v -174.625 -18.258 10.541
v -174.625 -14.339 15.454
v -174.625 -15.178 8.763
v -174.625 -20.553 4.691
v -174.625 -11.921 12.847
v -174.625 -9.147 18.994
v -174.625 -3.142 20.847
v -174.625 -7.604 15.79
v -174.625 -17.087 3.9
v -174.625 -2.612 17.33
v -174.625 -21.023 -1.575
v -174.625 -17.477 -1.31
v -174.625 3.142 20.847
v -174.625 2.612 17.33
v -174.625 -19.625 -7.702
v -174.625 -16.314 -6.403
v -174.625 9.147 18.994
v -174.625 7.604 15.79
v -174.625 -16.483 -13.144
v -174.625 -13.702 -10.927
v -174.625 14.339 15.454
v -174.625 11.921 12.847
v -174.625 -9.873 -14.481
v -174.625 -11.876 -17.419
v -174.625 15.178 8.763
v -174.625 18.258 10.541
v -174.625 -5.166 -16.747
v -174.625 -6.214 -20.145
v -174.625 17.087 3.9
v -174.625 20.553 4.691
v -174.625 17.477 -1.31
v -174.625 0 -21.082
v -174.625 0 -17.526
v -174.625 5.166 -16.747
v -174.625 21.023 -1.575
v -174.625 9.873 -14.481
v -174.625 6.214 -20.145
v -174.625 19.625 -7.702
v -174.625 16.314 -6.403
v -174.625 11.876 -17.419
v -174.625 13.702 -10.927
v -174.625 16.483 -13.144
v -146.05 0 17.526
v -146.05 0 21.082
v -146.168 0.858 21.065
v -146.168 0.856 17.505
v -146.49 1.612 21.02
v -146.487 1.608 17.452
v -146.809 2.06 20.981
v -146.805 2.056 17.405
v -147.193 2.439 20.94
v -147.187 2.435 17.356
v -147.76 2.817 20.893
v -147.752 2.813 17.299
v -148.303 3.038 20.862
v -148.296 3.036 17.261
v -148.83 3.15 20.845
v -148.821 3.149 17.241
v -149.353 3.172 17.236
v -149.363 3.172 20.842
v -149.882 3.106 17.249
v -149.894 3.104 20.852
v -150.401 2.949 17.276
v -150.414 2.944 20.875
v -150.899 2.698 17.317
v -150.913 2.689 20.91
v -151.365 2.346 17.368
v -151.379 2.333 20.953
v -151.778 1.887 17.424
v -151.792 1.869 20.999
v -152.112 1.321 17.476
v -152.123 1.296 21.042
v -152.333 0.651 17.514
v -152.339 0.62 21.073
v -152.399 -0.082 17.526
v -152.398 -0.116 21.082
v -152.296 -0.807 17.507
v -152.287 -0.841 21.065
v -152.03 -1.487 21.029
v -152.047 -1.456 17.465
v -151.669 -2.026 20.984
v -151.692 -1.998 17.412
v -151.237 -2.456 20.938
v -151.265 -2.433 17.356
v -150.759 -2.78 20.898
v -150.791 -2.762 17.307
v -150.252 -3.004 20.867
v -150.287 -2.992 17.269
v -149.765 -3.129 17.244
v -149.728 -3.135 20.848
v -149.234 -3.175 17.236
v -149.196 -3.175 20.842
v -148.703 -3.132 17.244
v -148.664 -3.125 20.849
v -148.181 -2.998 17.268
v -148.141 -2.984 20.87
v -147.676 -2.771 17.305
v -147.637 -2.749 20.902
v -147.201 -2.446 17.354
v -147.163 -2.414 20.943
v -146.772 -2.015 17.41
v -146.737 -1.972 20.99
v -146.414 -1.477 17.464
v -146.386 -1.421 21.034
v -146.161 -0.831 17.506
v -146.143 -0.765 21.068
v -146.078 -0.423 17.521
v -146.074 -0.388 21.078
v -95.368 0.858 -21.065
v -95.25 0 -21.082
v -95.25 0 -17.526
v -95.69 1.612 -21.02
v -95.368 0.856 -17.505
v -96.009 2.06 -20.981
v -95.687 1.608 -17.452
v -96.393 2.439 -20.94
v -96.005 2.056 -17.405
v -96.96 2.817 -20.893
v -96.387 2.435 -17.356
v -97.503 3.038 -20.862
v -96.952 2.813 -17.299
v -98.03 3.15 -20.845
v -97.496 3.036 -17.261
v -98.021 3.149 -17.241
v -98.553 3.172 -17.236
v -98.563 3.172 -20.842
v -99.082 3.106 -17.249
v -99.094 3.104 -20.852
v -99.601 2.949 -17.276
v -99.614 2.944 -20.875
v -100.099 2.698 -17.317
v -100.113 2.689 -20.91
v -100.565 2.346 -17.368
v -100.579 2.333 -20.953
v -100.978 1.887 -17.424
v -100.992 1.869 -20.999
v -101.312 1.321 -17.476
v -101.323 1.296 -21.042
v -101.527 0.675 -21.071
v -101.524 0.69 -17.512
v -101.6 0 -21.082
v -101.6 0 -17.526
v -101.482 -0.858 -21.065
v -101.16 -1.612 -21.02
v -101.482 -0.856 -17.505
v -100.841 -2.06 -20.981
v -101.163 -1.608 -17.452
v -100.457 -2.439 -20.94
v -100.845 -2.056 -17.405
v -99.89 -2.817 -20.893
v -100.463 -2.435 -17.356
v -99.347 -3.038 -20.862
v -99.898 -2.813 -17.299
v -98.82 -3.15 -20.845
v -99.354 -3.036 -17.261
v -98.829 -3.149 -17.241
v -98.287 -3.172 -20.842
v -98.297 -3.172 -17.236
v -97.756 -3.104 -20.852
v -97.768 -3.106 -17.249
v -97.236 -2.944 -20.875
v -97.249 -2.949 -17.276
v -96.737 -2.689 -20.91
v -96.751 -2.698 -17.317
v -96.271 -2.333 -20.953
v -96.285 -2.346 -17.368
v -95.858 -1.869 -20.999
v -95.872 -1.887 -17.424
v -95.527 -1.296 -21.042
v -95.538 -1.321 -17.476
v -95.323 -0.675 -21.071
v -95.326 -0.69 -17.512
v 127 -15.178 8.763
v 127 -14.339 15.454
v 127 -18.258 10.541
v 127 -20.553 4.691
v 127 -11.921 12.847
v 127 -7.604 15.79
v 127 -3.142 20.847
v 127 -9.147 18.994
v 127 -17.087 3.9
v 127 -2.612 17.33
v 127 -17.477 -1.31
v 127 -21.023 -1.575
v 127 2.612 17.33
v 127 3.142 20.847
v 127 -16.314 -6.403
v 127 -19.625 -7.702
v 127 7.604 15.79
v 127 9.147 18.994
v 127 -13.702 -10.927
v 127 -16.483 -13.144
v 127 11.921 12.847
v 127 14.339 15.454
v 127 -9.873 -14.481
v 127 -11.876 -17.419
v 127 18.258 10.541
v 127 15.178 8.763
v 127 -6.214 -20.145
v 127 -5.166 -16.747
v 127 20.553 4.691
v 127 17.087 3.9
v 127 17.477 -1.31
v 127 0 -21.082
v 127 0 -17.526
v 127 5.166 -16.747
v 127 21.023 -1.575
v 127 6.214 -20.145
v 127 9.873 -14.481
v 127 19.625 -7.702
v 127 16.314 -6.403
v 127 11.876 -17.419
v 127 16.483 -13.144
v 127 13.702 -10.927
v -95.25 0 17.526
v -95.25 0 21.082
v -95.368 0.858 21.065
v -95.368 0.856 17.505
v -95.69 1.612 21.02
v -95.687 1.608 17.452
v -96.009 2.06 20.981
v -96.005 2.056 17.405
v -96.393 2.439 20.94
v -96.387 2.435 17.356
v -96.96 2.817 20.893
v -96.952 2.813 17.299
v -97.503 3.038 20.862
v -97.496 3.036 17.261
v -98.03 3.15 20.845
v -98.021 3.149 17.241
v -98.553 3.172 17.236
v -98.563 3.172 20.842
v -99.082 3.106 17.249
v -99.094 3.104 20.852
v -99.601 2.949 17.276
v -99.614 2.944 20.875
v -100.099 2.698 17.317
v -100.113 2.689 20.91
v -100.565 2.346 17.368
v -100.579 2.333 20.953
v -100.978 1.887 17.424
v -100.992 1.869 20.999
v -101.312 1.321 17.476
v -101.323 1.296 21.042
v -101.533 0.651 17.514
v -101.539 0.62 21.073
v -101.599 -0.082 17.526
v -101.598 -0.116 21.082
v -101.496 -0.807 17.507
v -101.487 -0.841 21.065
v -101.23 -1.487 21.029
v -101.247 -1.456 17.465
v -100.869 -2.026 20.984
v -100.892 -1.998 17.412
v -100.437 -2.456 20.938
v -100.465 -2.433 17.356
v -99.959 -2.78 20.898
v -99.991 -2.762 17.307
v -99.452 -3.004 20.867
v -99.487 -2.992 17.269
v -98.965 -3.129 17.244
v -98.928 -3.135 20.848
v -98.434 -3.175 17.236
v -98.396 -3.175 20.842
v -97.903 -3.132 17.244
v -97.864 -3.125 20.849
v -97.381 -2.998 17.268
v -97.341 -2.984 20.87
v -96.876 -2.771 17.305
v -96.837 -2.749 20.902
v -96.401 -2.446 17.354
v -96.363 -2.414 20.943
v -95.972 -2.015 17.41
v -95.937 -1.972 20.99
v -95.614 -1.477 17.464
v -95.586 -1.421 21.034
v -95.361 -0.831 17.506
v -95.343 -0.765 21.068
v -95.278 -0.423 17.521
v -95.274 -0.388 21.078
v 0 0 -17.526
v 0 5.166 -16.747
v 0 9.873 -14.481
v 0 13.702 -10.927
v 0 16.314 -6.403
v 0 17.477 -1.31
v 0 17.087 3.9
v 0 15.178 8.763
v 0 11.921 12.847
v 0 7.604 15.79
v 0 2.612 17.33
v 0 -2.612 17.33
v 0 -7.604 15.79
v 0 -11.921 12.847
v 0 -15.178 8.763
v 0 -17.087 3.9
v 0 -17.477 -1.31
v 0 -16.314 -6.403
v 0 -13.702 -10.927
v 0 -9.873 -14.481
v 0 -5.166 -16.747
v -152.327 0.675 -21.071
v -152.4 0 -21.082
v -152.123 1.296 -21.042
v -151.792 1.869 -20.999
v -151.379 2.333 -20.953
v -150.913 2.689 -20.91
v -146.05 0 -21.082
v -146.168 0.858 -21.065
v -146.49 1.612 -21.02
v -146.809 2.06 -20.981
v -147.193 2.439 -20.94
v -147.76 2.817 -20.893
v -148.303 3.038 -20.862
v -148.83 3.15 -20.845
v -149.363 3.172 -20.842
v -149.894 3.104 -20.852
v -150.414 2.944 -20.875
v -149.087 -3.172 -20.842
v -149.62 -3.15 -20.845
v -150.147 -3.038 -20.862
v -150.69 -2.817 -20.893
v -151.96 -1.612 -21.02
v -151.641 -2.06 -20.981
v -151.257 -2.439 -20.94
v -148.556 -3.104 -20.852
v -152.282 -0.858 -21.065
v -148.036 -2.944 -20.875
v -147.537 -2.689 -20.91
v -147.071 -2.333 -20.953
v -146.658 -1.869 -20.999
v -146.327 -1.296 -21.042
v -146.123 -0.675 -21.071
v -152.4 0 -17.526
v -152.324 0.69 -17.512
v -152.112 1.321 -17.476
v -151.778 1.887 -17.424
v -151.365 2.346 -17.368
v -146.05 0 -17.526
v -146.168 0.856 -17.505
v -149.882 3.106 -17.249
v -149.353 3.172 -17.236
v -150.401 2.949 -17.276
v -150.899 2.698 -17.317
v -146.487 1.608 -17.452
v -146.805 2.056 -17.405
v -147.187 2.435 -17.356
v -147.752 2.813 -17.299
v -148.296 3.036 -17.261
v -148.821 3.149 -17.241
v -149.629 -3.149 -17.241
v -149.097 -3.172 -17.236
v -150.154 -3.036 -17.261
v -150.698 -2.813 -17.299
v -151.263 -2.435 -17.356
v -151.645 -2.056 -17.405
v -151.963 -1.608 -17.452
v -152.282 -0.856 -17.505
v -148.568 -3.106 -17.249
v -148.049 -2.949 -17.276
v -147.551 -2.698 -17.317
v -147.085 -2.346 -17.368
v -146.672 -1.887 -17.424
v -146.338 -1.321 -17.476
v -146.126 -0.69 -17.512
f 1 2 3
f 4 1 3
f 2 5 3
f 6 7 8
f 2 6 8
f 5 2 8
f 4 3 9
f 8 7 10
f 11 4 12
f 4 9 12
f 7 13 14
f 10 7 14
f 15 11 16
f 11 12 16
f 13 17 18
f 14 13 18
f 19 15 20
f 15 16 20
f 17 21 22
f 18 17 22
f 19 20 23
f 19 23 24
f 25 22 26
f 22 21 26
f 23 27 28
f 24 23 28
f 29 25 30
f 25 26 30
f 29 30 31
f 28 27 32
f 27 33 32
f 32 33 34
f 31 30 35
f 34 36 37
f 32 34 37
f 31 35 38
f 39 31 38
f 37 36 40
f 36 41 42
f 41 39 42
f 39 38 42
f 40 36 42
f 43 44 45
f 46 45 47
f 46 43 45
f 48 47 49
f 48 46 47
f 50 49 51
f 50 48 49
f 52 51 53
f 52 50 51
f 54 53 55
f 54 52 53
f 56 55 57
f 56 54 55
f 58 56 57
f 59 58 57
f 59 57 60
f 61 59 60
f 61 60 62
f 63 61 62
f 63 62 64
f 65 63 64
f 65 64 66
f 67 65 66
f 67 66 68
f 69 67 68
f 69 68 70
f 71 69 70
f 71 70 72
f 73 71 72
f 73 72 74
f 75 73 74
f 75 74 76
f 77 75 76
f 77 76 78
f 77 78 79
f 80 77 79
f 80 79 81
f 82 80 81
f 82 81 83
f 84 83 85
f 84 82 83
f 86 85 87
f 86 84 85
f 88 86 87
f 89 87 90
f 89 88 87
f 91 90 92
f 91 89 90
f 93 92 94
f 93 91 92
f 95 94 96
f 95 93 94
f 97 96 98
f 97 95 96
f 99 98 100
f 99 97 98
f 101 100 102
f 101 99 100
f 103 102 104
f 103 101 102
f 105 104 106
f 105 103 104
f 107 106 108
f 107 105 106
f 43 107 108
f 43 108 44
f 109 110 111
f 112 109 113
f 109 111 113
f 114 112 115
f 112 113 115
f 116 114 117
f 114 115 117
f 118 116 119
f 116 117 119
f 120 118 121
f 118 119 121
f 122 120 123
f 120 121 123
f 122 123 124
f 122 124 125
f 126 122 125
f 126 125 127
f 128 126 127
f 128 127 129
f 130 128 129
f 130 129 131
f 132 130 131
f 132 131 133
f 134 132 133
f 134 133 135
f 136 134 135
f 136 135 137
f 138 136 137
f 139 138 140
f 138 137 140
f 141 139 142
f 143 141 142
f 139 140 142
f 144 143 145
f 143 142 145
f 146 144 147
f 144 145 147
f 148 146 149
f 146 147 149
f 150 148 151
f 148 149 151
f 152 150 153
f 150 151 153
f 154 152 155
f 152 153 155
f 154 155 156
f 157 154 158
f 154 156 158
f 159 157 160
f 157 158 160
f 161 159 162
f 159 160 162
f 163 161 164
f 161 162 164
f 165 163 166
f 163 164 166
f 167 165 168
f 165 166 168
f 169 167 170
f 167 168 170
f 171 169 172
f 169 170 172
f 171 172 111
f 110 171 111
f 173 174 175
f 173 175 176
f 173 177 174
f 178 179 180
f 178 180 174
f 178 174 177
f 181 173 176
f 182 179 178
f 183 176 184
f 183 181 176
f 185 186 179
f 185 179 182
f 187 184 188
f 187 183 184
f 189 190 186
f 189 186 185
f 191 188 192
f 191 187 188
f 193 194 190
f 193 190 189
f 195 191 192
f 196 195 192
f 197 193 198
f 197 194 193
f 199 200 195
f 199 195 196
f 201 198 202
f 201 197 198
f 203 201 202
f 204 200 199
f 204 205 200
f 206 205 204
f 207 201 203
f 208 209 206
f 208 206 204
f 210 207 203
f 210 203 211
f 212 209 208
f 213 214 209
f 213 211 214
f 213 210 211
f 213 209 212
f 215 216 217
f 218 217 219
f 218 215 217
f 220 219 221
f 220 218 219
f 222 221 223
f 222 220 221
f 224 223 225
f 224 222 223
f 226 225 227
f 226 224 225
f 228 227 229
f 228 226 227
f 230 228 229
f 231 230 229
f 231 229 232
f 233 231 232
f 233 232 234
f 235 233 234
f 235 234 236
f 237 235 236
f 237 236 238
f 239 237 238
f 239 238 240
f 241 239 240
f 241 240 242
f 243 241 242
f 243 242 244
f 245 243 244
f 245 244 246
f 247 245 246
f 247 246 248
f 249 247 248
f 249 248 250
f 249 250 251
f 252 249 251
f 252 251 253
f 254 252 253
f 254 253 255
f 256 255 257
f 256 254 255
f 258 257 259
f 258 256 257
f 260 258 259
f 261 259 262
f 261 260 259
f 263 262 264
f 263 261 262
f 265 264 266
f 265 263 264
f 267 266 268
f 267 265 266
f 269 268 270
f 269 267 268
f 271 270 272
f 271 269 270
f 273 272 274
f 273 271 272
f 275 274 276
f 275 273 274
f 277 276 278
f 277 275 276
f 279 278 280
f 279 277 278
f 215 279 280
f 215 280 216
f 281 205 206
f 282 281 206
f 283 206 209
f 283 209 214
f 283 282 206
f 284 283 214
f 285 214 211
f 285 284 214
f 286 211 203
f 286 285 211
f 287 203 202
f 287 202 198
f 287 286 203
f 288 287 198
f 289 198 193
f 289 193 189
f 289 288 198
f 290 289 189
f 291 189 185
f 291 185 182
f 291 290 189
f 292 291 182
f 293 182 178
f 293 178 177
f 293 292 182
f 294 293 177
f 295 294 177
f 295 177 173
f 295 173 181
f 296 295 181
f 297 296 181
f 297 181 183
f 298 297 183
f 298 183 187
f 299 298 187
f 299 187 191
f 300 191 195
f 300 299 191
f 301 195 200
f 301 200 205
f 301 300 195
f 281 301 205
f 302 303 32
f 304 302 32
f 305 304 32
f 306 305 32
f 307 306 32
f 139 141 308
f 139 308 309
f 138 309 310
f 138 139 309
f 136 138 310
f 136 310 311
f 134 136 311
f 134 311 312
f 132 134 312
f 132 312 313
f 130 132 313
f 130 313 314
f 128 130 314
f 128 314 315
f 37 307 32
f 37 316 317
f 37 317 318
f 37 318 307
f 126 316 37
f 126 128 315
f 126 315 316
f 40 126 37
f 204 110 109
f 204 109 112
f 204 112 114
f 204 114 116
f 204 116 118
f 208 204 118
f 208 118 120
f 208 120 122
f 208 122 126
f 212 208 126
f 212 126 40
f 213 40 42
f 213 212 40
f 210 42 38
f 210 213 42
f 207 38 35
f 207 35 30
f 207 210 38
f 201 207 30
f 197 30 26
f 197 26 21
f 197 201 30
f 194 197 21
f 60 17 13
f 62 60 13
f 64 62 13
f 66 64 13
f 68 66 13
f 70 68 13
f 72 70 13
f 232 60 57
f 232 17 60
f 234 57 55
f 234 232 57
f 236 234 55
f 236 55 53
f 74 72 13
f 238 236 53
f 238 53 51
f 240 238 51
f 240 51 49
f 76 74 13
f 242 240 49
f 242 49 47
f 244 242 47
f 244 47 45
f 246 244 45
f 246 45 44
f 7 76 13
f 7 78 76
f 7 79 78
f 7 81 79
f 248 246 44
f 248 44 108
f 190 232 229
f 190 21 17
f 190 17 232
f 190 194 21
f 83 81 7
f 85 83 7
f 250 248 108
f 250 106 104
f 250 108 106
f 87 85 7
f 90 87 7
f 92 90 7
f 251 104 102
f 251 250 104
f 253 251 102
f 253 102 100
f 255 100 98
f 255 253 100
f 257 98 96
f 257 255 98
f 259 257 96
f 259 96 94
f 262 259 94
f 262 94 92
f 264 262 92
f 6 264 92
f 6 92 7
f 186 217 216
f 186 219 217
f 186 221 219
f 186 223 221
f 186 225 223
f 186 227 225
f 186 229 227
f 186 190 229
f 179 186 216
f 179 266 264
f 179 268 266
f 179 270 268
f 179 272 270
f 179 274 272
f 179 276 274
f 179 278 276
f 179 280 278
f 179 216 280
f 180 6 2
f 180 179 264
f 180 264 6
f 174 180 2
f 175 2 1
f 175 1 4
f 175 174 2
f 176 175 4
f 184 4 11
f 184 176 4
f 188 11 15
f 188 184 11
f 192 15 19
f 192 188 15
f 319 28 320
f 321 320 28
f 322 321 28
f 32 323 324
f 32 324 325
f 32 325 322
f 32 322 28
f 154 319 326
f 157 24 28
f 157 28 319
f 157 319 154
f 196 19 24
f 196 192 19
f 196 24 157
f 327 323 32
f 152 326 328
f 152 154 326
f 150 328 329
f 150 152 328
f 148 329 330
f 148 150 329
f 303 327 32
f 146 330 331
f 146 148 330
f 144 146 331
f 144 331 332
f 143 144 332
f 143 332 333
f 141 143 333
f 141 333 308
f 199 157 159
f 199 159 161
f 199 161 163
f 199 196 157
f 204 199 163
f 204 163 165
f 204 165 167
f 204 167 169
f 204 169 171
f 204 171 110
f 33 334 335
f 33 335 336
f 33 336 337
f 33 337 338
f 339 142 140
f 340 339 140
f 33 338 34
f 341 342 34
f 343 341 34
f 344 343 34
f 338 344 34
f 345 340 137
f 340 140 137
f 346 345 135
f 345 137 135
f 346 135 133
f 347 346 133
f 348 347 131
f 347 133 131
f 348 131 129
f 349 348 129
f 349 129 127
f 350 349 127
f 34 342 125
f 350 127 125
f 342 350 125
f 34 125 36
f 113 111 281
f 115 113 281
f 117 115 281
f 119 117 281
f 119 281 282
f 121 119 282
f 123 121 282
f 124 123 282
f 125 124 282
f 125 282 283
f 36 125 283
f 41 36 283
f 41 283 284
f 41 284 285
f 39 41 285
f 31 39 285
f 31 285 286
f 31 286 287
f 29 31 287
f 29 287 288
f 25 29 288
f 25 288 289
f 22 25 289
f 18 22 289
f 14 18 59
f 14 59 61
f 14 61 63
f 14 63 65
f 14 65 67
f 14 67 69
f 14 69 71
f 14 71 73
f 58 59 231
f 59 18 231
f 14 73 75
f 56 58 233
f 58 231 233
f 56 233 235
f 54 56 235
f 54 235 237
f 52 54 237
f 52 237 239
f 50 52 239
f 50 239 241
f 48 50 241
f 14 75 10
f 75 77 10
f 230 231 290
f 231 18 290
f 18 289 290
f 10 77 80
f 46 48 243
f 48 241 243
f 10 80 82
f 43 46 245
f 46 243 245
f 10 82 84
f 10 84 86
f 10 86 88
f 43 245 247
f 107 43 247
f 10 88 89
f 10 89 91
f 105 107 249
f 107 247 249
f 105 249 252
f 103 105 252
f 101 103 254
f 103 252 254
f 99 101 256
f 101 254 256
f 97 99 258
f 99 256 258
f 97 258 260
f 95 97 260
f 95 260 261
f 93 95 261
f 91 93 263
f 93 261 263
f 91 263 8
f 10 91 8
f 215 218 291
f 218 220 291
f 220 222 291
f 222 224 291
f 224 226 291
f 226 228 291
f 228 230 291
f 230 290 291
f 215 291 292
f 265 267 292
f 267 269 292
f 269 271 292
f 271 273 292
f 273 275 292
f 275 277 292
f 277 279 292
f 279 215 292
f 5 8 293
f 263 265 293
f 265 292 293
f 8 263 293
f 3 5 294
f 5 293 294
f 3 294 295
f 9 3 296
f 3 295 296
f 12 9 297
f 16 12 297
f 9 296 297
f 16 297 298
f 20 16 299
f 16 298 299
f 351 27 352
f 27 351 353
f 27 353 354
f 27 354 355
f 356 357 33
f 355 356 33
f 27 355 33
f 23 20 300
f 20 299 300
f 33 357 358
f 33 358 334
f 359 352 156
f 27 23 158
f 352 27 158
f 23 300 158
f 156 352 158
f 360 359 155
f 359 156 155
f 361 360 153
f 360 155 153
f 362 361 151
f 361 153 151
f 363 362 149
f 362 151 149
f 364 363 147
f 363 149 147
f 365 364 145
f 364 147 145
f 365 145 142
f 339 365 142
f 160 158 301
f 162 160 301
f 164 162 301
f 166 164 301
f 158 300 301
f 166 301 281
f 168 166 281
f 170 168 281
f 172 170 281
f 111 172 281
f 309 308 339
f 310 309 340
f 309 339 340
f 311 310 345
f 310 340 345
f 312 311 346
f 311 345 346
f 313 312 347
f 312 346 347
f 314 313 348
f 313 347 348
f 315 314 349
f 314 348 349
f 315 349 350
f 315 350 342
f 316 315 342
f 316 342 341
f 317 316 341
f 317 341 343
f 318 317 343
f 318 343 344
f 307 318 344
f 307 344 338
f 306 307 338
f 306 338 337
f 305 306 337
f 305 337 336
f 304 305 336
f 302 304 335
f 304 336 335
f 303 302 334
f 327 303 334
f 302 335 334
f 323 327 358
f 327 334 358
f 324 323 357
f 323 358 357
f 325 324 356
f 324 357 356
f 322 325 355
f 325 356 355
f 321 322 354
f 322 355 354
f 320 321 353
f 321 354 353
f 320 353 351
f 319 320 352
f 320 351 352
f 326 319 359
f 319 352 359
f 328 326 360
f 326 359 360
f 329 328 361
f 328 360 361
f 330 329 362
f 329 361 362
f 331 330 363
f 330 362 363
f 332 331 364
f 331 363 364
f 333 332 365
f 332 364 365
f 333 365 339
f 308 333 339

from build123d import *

# Parameters (mm, degrees)
SKETCH1_R                = 21.082
SKETCH1_R_2              = 17.526
BOSS_EXTRUDE1_DEPTH      = 127
BOSS_EXTRUDE1_DEPTH_BACK = 174.625
SKETCH2_R                = 3.175
CUT_EXTRUDE1_DEPTH       = 22.082
CUT_EXTRUDE1_DEPTH_BACK  = 22.082


with BuildPart() as part:
    # Sketch1 → Boss-Extrude1 (new body, two sides)
    with BuildSketch(Plane(origin=(0, 0, 0), x_dir=(0, 0, -1), z_dir=(1, 0, 0))) as boss_extrude1_sk:
        Circle(SKETCH1_R)
        Circle(SKETCH1_R_2, mode=Mode.SUBTRACT)
    extrude(amount=BOSS_EXTRUDE1_DEPTH)
    extrude(boss_extrude1_sk.sketch, amount=-BOSS_EXTRUDE1_DEPTH_BACK)

    # Sketch2 → Cut-Extrude1 (cut, two sides)
    with BuildSketch(Plane.XY) as cut_extrude1_sk:
        with Locations((-98.425, 0)):
            Circle(SKETCH2_R)
        with Locations((-149.225, 0)):
            Circle(SKETCH2_R)
    extrude(amount=CUT_EXTRUDE1_DEPTH, mode=Mode.SUBTRACT)
    extrude(cut_extrude1_sk.sketch, amount=-CUT_EXTRUDE1_DEPTH_BACK, mode=Mode.SUBTRACT)


solid = part.part
